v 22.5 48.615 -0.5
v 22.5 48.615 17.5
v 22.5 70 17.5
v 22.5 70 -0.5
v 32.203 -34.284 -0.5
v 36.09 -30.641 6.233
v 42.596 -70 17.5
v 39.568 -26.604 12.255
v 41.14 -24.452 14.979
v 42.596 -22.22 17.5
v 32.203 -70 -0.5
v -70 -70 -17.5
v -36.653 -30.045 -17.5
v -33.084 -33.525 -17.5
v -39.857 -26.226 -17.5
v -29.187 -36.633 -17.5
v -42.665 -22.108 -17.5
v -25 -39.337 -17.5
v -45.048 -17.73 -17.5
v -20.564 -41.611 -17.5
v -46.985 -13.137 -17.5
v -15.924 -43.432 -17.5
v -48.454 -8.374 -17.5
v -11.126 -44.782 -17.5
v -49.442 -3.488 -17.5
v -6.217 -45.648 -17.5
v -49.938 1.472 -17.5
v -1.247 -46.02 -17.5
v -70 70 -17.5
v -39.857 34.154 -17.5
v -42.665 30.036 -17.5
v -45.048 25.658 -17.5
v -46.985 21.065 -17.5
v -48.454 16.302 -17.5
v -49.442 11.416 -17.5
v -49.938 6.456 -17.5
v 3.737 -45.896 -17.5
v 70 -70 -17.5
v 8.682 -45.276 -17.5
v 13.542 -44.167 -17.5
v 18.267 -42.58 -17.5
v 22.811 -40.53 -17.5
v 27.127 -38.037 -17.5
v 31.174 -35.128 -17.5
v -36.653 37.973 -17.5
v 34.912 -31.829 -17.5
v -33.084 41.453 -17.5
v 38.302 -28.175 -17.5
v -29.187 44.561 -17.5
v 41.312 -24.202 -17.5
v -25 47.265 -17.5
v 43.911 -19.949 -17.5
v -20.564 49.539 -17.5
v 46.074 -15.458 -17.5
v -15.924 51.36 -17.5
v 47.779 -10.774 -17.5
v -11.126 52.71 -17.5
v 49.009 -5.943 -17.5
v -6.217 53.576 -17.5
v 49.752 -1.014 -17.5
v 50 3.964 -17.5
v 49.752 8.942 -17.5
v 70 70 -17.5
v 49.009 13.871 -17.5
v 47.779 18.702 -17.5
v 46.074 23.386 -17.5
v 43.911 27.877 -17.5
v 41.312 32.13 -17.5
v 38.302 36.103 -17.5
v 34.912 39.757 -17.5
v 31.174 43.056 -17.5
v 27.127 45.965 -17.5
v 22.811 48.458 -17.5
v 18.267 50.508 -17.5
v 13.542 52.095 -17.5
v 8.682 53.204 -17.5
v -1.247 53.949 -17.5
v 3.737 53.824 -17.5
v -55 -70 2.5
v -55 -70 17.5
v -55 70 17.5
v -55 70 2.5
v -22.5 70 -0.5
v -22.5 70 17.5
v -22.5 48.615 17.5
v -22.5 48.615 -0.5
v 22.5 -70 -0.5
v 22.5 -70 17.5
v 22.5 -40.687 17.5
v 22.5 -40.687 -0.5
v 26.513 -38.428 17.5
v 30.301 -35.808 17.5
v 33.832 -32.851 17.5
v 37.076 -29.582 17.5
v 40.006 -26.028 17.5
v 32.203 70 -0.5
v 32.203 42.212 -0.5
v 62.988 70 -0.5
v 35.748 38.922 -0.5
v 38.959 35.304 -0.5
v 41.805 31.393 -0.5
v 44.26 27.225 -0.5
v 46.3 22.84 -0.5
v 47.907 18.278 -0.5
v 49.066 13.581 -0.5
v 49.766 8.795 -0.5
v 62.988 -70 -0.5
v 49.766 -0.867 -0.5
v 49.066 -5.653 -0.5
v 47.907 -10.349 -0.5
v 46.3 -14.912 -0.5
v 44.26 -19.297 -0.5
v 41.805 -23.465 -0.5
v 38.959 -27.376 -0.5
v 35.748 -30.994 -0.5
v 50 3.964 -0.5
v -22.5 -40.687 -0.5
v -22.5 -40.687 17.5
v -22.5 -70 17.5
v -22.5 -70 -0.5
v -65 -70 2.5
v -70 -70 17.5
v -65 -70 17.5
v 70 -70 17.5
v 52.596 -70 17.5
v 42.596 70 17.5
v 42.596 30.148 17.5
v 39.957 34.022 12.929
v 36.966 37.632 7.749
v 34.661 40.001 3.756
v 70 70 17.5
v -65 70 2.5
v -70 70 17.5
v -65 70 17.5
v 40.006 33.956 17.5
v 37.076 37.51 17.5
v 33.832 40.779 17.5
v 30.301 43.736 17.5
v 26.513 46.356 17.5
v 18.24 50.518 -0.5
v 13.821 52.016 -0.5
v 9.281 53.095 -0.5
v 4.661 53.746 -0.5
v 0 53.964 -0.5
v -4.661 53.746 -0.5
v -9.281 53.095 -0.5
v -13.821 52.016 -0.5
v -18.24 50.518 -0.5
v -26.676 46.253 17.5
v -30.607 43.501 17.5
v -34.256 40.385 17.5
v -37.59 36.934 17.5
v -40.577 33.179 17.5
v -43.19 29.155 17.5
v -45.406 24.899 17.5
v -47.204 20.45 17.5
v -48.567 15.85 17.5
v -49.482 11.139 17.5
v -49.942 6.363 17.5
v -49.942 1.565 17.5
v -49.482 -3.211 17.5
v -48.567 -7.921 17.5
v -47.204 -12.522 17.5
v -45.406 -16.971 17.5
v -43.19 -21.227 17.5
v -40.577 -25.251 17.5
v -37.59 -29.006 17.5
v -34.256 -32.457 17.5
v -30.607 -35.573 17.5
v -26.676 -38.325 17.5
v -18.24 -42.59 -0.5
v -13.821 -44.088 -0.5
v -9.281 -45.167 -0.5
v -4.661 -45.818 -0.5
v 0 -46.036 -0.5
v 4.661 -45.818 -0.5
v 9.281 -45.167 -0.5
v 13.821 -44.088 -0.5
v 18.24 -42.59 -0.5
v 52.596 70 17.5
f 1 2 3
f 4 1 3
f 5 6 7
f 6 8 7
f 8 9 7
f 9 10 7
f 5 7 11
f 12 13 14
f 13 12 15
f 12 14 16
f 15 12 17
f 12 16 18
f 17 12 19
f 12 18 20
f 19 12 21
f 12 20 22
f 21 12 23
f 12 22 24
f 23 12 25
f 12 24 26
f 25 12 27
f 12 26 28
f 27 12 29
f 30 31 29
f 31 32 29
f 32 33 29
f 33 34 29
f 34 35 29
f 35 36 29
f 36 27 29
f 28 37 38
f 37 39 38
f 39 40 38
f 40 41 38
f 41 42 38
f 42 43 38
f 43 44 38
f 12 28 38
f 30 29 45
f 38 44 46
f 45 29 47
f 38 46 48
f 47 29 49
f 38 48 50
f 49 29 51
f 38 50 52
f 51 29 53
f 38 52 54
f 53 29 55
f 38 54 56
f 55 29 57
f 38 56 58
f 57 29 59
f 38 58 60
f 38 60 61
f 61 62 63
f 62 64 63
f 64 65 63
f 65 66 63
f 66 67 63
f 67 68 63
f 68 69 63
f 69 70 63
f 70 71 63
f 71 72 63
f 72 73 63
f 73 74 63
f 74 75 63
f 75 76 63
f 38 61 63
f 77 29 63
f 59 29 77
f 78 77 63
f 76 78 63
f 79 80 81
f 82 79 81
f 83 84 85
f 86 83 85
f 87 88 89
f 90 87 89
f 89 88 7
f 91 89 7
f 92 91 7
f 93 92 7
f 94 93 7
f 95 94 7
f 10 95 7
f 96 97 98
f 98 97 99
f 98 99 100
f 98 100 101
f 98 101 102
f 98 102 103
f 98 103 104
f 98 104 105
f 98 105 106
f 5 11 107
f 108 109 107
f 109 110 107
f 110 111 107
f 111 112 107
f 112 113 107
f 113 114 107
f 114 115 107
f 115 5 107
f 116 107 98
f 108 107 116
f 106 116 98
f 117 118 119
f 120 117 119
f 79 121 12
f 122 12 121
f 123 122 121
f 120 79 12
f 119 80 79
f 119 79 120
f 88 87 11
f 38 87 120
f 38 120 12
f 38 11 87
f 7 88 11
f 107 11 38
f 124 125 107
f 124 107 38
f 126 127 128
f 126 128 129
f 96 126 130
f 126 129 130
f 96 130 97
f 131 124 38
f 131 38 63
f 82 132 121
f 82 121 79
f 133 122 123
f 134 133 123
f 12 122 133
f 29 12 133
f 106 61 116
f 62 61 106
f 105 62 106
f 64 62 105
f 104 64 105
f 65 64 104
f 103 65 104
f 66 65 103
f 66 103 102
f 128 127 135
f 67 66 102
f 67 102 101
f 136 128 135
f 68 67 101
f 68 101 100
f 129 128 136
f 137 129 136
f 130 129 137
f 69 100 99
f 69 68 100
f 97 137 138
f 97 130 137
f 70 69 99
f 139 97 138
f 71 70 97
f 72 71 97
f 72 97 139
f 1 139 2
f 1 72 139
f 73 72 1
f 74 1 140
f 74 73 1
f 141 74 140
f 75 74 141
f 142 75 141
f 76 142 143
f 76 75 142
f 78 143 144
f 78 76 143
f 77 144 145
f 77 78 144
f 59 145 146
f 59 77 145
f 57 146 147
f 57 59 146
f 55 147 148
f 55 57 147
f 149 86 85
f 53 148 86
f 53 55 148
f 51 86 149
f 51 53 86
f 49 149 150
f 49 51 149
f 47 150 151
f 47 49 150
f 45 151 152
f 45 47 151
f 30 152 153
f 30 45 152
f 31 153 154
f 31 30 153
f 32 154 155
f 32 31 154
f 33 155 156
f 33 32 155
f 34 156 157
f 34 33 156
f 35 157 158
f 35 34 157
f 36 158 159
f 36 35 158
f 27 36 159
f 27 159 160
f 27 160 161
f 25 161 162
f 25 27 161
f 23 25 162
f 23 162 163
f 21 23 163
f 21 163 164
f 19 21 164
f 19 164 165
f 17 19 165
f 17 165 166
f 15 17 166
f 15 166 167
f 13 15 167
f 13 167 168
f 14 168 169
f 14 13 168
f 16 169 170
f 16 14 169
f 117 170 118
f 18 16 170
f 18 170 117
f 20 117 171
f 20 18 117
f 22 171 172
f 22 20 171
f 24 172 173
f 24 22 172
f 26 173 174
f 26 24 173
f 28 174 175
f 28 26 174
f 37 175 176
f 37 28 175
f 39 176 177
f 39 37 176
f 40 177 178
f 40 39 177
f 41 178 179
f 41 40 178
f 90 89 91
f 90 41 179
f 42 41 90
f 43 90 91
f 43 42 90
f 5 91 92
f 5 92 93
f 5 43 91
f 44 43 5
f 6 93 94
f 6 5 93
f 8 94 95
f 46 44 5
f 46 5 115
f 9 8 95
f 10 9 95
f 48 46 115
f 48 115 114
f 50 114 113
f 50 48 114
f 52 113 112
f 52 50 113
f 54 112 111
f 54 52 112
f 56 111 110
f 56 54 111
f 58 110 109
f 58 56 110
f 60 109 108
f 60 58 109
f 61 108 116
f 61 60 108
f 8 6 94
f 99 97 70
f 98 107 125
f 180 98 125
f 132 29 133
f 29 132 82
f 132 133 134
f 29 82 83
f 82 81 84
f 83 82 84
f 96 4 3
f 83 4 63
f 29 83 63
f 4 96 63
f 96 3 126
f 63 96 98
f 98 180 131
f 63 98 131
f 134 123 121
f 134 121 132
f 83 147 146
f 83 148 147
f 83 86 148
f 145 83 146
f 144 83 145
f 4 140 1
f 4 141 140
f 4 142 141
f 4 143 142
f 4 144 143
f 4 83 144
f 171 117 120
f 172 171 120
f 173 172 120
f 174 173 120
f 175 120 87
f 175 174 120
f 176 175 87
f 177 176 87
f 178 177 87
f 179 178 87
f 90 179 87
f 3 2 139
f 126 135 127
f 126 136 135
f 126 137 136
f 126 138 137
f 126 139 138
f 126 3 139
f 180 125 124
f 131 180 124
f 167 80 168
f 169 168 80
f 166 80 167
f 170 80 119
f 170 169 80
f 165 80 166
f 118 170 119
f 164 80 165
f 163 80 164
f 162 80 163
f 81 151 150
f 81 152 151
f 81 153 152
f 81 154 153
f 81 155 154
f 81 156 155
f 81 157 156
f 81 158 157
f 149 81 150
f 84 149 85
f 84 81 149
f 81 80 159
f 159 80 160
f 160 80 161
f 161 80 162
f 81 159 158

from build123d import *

# Parameters (mm, degrees)
F0_W     = 140
F0_H     = 140
F0_R     = 50
F1_DEPTH = 17.5
F2_W     = 10
F2_H     = 140
F3_DEPTH = 15
F5_DEPTH = 18
F7_DEPTH = 172.6


with BuildPart() as f1:
    # F0 (on Top) → F1 (new body, symmetric)
    with BuildSketch(Plane.XY):
        Rectangle(F0_W, F0_H)
        with Locations((0, 3.96405)):
            Circle(F0_R, mode=Mode.SUBTRACT)
    extrude(amount=F1_DEPTH, both=True)

    # F2 (on face) → F3 (cut)
    with BuildSketch(Plane.XY.offset(17.5)):
        with Locations((-60, 0)):
            Rectangle(F2_W, F2_H)
    extrude(amount=-F3_DEPTH, mode=Mode.SUBTRACT)

    # F4 (on face) → F5 (cut)
    with BuildSketch(Plane.XY.offset(17.5)):
        with BuildLine():
            Line((22.5, -70), (22.5, -40.687378))
            ThreePointArc((22.5, -40.687378), (0, -46.03595), (-22.5, -40.687378))
            Line((-22.5, -40.687378), (-22.5, -70))
            Line((-22.5, -70), (22.5, -70))
        make_face()
        with BuildLine():
            Line((22.5, 48.615477), (22.5, 70))
            Line((22.5, 70), (-22.5, 70))
            Line((-22.5, 70), (-22.5, 48.615477))
            ThreePointArc((-22.5, 48.615477), (0, 53.96405), (22.5, 48.615477))
        make_face()
    extrude(amount=-F5_DEPTH, mode=Mode.SUBTRACT)

    # F6 (on face) → F7 (cut)
    with BuildSketch(Plane.XZ.offset(70)):
        Polygon((52.595693, 17.5), (42.595693, 17.5), (32.203389, -0.5), (62.987998, -0.5), align=None)
    extrude(amount=-F7_DEPTH, mode=Mode.SUBTRACT)


solid = f1.part
